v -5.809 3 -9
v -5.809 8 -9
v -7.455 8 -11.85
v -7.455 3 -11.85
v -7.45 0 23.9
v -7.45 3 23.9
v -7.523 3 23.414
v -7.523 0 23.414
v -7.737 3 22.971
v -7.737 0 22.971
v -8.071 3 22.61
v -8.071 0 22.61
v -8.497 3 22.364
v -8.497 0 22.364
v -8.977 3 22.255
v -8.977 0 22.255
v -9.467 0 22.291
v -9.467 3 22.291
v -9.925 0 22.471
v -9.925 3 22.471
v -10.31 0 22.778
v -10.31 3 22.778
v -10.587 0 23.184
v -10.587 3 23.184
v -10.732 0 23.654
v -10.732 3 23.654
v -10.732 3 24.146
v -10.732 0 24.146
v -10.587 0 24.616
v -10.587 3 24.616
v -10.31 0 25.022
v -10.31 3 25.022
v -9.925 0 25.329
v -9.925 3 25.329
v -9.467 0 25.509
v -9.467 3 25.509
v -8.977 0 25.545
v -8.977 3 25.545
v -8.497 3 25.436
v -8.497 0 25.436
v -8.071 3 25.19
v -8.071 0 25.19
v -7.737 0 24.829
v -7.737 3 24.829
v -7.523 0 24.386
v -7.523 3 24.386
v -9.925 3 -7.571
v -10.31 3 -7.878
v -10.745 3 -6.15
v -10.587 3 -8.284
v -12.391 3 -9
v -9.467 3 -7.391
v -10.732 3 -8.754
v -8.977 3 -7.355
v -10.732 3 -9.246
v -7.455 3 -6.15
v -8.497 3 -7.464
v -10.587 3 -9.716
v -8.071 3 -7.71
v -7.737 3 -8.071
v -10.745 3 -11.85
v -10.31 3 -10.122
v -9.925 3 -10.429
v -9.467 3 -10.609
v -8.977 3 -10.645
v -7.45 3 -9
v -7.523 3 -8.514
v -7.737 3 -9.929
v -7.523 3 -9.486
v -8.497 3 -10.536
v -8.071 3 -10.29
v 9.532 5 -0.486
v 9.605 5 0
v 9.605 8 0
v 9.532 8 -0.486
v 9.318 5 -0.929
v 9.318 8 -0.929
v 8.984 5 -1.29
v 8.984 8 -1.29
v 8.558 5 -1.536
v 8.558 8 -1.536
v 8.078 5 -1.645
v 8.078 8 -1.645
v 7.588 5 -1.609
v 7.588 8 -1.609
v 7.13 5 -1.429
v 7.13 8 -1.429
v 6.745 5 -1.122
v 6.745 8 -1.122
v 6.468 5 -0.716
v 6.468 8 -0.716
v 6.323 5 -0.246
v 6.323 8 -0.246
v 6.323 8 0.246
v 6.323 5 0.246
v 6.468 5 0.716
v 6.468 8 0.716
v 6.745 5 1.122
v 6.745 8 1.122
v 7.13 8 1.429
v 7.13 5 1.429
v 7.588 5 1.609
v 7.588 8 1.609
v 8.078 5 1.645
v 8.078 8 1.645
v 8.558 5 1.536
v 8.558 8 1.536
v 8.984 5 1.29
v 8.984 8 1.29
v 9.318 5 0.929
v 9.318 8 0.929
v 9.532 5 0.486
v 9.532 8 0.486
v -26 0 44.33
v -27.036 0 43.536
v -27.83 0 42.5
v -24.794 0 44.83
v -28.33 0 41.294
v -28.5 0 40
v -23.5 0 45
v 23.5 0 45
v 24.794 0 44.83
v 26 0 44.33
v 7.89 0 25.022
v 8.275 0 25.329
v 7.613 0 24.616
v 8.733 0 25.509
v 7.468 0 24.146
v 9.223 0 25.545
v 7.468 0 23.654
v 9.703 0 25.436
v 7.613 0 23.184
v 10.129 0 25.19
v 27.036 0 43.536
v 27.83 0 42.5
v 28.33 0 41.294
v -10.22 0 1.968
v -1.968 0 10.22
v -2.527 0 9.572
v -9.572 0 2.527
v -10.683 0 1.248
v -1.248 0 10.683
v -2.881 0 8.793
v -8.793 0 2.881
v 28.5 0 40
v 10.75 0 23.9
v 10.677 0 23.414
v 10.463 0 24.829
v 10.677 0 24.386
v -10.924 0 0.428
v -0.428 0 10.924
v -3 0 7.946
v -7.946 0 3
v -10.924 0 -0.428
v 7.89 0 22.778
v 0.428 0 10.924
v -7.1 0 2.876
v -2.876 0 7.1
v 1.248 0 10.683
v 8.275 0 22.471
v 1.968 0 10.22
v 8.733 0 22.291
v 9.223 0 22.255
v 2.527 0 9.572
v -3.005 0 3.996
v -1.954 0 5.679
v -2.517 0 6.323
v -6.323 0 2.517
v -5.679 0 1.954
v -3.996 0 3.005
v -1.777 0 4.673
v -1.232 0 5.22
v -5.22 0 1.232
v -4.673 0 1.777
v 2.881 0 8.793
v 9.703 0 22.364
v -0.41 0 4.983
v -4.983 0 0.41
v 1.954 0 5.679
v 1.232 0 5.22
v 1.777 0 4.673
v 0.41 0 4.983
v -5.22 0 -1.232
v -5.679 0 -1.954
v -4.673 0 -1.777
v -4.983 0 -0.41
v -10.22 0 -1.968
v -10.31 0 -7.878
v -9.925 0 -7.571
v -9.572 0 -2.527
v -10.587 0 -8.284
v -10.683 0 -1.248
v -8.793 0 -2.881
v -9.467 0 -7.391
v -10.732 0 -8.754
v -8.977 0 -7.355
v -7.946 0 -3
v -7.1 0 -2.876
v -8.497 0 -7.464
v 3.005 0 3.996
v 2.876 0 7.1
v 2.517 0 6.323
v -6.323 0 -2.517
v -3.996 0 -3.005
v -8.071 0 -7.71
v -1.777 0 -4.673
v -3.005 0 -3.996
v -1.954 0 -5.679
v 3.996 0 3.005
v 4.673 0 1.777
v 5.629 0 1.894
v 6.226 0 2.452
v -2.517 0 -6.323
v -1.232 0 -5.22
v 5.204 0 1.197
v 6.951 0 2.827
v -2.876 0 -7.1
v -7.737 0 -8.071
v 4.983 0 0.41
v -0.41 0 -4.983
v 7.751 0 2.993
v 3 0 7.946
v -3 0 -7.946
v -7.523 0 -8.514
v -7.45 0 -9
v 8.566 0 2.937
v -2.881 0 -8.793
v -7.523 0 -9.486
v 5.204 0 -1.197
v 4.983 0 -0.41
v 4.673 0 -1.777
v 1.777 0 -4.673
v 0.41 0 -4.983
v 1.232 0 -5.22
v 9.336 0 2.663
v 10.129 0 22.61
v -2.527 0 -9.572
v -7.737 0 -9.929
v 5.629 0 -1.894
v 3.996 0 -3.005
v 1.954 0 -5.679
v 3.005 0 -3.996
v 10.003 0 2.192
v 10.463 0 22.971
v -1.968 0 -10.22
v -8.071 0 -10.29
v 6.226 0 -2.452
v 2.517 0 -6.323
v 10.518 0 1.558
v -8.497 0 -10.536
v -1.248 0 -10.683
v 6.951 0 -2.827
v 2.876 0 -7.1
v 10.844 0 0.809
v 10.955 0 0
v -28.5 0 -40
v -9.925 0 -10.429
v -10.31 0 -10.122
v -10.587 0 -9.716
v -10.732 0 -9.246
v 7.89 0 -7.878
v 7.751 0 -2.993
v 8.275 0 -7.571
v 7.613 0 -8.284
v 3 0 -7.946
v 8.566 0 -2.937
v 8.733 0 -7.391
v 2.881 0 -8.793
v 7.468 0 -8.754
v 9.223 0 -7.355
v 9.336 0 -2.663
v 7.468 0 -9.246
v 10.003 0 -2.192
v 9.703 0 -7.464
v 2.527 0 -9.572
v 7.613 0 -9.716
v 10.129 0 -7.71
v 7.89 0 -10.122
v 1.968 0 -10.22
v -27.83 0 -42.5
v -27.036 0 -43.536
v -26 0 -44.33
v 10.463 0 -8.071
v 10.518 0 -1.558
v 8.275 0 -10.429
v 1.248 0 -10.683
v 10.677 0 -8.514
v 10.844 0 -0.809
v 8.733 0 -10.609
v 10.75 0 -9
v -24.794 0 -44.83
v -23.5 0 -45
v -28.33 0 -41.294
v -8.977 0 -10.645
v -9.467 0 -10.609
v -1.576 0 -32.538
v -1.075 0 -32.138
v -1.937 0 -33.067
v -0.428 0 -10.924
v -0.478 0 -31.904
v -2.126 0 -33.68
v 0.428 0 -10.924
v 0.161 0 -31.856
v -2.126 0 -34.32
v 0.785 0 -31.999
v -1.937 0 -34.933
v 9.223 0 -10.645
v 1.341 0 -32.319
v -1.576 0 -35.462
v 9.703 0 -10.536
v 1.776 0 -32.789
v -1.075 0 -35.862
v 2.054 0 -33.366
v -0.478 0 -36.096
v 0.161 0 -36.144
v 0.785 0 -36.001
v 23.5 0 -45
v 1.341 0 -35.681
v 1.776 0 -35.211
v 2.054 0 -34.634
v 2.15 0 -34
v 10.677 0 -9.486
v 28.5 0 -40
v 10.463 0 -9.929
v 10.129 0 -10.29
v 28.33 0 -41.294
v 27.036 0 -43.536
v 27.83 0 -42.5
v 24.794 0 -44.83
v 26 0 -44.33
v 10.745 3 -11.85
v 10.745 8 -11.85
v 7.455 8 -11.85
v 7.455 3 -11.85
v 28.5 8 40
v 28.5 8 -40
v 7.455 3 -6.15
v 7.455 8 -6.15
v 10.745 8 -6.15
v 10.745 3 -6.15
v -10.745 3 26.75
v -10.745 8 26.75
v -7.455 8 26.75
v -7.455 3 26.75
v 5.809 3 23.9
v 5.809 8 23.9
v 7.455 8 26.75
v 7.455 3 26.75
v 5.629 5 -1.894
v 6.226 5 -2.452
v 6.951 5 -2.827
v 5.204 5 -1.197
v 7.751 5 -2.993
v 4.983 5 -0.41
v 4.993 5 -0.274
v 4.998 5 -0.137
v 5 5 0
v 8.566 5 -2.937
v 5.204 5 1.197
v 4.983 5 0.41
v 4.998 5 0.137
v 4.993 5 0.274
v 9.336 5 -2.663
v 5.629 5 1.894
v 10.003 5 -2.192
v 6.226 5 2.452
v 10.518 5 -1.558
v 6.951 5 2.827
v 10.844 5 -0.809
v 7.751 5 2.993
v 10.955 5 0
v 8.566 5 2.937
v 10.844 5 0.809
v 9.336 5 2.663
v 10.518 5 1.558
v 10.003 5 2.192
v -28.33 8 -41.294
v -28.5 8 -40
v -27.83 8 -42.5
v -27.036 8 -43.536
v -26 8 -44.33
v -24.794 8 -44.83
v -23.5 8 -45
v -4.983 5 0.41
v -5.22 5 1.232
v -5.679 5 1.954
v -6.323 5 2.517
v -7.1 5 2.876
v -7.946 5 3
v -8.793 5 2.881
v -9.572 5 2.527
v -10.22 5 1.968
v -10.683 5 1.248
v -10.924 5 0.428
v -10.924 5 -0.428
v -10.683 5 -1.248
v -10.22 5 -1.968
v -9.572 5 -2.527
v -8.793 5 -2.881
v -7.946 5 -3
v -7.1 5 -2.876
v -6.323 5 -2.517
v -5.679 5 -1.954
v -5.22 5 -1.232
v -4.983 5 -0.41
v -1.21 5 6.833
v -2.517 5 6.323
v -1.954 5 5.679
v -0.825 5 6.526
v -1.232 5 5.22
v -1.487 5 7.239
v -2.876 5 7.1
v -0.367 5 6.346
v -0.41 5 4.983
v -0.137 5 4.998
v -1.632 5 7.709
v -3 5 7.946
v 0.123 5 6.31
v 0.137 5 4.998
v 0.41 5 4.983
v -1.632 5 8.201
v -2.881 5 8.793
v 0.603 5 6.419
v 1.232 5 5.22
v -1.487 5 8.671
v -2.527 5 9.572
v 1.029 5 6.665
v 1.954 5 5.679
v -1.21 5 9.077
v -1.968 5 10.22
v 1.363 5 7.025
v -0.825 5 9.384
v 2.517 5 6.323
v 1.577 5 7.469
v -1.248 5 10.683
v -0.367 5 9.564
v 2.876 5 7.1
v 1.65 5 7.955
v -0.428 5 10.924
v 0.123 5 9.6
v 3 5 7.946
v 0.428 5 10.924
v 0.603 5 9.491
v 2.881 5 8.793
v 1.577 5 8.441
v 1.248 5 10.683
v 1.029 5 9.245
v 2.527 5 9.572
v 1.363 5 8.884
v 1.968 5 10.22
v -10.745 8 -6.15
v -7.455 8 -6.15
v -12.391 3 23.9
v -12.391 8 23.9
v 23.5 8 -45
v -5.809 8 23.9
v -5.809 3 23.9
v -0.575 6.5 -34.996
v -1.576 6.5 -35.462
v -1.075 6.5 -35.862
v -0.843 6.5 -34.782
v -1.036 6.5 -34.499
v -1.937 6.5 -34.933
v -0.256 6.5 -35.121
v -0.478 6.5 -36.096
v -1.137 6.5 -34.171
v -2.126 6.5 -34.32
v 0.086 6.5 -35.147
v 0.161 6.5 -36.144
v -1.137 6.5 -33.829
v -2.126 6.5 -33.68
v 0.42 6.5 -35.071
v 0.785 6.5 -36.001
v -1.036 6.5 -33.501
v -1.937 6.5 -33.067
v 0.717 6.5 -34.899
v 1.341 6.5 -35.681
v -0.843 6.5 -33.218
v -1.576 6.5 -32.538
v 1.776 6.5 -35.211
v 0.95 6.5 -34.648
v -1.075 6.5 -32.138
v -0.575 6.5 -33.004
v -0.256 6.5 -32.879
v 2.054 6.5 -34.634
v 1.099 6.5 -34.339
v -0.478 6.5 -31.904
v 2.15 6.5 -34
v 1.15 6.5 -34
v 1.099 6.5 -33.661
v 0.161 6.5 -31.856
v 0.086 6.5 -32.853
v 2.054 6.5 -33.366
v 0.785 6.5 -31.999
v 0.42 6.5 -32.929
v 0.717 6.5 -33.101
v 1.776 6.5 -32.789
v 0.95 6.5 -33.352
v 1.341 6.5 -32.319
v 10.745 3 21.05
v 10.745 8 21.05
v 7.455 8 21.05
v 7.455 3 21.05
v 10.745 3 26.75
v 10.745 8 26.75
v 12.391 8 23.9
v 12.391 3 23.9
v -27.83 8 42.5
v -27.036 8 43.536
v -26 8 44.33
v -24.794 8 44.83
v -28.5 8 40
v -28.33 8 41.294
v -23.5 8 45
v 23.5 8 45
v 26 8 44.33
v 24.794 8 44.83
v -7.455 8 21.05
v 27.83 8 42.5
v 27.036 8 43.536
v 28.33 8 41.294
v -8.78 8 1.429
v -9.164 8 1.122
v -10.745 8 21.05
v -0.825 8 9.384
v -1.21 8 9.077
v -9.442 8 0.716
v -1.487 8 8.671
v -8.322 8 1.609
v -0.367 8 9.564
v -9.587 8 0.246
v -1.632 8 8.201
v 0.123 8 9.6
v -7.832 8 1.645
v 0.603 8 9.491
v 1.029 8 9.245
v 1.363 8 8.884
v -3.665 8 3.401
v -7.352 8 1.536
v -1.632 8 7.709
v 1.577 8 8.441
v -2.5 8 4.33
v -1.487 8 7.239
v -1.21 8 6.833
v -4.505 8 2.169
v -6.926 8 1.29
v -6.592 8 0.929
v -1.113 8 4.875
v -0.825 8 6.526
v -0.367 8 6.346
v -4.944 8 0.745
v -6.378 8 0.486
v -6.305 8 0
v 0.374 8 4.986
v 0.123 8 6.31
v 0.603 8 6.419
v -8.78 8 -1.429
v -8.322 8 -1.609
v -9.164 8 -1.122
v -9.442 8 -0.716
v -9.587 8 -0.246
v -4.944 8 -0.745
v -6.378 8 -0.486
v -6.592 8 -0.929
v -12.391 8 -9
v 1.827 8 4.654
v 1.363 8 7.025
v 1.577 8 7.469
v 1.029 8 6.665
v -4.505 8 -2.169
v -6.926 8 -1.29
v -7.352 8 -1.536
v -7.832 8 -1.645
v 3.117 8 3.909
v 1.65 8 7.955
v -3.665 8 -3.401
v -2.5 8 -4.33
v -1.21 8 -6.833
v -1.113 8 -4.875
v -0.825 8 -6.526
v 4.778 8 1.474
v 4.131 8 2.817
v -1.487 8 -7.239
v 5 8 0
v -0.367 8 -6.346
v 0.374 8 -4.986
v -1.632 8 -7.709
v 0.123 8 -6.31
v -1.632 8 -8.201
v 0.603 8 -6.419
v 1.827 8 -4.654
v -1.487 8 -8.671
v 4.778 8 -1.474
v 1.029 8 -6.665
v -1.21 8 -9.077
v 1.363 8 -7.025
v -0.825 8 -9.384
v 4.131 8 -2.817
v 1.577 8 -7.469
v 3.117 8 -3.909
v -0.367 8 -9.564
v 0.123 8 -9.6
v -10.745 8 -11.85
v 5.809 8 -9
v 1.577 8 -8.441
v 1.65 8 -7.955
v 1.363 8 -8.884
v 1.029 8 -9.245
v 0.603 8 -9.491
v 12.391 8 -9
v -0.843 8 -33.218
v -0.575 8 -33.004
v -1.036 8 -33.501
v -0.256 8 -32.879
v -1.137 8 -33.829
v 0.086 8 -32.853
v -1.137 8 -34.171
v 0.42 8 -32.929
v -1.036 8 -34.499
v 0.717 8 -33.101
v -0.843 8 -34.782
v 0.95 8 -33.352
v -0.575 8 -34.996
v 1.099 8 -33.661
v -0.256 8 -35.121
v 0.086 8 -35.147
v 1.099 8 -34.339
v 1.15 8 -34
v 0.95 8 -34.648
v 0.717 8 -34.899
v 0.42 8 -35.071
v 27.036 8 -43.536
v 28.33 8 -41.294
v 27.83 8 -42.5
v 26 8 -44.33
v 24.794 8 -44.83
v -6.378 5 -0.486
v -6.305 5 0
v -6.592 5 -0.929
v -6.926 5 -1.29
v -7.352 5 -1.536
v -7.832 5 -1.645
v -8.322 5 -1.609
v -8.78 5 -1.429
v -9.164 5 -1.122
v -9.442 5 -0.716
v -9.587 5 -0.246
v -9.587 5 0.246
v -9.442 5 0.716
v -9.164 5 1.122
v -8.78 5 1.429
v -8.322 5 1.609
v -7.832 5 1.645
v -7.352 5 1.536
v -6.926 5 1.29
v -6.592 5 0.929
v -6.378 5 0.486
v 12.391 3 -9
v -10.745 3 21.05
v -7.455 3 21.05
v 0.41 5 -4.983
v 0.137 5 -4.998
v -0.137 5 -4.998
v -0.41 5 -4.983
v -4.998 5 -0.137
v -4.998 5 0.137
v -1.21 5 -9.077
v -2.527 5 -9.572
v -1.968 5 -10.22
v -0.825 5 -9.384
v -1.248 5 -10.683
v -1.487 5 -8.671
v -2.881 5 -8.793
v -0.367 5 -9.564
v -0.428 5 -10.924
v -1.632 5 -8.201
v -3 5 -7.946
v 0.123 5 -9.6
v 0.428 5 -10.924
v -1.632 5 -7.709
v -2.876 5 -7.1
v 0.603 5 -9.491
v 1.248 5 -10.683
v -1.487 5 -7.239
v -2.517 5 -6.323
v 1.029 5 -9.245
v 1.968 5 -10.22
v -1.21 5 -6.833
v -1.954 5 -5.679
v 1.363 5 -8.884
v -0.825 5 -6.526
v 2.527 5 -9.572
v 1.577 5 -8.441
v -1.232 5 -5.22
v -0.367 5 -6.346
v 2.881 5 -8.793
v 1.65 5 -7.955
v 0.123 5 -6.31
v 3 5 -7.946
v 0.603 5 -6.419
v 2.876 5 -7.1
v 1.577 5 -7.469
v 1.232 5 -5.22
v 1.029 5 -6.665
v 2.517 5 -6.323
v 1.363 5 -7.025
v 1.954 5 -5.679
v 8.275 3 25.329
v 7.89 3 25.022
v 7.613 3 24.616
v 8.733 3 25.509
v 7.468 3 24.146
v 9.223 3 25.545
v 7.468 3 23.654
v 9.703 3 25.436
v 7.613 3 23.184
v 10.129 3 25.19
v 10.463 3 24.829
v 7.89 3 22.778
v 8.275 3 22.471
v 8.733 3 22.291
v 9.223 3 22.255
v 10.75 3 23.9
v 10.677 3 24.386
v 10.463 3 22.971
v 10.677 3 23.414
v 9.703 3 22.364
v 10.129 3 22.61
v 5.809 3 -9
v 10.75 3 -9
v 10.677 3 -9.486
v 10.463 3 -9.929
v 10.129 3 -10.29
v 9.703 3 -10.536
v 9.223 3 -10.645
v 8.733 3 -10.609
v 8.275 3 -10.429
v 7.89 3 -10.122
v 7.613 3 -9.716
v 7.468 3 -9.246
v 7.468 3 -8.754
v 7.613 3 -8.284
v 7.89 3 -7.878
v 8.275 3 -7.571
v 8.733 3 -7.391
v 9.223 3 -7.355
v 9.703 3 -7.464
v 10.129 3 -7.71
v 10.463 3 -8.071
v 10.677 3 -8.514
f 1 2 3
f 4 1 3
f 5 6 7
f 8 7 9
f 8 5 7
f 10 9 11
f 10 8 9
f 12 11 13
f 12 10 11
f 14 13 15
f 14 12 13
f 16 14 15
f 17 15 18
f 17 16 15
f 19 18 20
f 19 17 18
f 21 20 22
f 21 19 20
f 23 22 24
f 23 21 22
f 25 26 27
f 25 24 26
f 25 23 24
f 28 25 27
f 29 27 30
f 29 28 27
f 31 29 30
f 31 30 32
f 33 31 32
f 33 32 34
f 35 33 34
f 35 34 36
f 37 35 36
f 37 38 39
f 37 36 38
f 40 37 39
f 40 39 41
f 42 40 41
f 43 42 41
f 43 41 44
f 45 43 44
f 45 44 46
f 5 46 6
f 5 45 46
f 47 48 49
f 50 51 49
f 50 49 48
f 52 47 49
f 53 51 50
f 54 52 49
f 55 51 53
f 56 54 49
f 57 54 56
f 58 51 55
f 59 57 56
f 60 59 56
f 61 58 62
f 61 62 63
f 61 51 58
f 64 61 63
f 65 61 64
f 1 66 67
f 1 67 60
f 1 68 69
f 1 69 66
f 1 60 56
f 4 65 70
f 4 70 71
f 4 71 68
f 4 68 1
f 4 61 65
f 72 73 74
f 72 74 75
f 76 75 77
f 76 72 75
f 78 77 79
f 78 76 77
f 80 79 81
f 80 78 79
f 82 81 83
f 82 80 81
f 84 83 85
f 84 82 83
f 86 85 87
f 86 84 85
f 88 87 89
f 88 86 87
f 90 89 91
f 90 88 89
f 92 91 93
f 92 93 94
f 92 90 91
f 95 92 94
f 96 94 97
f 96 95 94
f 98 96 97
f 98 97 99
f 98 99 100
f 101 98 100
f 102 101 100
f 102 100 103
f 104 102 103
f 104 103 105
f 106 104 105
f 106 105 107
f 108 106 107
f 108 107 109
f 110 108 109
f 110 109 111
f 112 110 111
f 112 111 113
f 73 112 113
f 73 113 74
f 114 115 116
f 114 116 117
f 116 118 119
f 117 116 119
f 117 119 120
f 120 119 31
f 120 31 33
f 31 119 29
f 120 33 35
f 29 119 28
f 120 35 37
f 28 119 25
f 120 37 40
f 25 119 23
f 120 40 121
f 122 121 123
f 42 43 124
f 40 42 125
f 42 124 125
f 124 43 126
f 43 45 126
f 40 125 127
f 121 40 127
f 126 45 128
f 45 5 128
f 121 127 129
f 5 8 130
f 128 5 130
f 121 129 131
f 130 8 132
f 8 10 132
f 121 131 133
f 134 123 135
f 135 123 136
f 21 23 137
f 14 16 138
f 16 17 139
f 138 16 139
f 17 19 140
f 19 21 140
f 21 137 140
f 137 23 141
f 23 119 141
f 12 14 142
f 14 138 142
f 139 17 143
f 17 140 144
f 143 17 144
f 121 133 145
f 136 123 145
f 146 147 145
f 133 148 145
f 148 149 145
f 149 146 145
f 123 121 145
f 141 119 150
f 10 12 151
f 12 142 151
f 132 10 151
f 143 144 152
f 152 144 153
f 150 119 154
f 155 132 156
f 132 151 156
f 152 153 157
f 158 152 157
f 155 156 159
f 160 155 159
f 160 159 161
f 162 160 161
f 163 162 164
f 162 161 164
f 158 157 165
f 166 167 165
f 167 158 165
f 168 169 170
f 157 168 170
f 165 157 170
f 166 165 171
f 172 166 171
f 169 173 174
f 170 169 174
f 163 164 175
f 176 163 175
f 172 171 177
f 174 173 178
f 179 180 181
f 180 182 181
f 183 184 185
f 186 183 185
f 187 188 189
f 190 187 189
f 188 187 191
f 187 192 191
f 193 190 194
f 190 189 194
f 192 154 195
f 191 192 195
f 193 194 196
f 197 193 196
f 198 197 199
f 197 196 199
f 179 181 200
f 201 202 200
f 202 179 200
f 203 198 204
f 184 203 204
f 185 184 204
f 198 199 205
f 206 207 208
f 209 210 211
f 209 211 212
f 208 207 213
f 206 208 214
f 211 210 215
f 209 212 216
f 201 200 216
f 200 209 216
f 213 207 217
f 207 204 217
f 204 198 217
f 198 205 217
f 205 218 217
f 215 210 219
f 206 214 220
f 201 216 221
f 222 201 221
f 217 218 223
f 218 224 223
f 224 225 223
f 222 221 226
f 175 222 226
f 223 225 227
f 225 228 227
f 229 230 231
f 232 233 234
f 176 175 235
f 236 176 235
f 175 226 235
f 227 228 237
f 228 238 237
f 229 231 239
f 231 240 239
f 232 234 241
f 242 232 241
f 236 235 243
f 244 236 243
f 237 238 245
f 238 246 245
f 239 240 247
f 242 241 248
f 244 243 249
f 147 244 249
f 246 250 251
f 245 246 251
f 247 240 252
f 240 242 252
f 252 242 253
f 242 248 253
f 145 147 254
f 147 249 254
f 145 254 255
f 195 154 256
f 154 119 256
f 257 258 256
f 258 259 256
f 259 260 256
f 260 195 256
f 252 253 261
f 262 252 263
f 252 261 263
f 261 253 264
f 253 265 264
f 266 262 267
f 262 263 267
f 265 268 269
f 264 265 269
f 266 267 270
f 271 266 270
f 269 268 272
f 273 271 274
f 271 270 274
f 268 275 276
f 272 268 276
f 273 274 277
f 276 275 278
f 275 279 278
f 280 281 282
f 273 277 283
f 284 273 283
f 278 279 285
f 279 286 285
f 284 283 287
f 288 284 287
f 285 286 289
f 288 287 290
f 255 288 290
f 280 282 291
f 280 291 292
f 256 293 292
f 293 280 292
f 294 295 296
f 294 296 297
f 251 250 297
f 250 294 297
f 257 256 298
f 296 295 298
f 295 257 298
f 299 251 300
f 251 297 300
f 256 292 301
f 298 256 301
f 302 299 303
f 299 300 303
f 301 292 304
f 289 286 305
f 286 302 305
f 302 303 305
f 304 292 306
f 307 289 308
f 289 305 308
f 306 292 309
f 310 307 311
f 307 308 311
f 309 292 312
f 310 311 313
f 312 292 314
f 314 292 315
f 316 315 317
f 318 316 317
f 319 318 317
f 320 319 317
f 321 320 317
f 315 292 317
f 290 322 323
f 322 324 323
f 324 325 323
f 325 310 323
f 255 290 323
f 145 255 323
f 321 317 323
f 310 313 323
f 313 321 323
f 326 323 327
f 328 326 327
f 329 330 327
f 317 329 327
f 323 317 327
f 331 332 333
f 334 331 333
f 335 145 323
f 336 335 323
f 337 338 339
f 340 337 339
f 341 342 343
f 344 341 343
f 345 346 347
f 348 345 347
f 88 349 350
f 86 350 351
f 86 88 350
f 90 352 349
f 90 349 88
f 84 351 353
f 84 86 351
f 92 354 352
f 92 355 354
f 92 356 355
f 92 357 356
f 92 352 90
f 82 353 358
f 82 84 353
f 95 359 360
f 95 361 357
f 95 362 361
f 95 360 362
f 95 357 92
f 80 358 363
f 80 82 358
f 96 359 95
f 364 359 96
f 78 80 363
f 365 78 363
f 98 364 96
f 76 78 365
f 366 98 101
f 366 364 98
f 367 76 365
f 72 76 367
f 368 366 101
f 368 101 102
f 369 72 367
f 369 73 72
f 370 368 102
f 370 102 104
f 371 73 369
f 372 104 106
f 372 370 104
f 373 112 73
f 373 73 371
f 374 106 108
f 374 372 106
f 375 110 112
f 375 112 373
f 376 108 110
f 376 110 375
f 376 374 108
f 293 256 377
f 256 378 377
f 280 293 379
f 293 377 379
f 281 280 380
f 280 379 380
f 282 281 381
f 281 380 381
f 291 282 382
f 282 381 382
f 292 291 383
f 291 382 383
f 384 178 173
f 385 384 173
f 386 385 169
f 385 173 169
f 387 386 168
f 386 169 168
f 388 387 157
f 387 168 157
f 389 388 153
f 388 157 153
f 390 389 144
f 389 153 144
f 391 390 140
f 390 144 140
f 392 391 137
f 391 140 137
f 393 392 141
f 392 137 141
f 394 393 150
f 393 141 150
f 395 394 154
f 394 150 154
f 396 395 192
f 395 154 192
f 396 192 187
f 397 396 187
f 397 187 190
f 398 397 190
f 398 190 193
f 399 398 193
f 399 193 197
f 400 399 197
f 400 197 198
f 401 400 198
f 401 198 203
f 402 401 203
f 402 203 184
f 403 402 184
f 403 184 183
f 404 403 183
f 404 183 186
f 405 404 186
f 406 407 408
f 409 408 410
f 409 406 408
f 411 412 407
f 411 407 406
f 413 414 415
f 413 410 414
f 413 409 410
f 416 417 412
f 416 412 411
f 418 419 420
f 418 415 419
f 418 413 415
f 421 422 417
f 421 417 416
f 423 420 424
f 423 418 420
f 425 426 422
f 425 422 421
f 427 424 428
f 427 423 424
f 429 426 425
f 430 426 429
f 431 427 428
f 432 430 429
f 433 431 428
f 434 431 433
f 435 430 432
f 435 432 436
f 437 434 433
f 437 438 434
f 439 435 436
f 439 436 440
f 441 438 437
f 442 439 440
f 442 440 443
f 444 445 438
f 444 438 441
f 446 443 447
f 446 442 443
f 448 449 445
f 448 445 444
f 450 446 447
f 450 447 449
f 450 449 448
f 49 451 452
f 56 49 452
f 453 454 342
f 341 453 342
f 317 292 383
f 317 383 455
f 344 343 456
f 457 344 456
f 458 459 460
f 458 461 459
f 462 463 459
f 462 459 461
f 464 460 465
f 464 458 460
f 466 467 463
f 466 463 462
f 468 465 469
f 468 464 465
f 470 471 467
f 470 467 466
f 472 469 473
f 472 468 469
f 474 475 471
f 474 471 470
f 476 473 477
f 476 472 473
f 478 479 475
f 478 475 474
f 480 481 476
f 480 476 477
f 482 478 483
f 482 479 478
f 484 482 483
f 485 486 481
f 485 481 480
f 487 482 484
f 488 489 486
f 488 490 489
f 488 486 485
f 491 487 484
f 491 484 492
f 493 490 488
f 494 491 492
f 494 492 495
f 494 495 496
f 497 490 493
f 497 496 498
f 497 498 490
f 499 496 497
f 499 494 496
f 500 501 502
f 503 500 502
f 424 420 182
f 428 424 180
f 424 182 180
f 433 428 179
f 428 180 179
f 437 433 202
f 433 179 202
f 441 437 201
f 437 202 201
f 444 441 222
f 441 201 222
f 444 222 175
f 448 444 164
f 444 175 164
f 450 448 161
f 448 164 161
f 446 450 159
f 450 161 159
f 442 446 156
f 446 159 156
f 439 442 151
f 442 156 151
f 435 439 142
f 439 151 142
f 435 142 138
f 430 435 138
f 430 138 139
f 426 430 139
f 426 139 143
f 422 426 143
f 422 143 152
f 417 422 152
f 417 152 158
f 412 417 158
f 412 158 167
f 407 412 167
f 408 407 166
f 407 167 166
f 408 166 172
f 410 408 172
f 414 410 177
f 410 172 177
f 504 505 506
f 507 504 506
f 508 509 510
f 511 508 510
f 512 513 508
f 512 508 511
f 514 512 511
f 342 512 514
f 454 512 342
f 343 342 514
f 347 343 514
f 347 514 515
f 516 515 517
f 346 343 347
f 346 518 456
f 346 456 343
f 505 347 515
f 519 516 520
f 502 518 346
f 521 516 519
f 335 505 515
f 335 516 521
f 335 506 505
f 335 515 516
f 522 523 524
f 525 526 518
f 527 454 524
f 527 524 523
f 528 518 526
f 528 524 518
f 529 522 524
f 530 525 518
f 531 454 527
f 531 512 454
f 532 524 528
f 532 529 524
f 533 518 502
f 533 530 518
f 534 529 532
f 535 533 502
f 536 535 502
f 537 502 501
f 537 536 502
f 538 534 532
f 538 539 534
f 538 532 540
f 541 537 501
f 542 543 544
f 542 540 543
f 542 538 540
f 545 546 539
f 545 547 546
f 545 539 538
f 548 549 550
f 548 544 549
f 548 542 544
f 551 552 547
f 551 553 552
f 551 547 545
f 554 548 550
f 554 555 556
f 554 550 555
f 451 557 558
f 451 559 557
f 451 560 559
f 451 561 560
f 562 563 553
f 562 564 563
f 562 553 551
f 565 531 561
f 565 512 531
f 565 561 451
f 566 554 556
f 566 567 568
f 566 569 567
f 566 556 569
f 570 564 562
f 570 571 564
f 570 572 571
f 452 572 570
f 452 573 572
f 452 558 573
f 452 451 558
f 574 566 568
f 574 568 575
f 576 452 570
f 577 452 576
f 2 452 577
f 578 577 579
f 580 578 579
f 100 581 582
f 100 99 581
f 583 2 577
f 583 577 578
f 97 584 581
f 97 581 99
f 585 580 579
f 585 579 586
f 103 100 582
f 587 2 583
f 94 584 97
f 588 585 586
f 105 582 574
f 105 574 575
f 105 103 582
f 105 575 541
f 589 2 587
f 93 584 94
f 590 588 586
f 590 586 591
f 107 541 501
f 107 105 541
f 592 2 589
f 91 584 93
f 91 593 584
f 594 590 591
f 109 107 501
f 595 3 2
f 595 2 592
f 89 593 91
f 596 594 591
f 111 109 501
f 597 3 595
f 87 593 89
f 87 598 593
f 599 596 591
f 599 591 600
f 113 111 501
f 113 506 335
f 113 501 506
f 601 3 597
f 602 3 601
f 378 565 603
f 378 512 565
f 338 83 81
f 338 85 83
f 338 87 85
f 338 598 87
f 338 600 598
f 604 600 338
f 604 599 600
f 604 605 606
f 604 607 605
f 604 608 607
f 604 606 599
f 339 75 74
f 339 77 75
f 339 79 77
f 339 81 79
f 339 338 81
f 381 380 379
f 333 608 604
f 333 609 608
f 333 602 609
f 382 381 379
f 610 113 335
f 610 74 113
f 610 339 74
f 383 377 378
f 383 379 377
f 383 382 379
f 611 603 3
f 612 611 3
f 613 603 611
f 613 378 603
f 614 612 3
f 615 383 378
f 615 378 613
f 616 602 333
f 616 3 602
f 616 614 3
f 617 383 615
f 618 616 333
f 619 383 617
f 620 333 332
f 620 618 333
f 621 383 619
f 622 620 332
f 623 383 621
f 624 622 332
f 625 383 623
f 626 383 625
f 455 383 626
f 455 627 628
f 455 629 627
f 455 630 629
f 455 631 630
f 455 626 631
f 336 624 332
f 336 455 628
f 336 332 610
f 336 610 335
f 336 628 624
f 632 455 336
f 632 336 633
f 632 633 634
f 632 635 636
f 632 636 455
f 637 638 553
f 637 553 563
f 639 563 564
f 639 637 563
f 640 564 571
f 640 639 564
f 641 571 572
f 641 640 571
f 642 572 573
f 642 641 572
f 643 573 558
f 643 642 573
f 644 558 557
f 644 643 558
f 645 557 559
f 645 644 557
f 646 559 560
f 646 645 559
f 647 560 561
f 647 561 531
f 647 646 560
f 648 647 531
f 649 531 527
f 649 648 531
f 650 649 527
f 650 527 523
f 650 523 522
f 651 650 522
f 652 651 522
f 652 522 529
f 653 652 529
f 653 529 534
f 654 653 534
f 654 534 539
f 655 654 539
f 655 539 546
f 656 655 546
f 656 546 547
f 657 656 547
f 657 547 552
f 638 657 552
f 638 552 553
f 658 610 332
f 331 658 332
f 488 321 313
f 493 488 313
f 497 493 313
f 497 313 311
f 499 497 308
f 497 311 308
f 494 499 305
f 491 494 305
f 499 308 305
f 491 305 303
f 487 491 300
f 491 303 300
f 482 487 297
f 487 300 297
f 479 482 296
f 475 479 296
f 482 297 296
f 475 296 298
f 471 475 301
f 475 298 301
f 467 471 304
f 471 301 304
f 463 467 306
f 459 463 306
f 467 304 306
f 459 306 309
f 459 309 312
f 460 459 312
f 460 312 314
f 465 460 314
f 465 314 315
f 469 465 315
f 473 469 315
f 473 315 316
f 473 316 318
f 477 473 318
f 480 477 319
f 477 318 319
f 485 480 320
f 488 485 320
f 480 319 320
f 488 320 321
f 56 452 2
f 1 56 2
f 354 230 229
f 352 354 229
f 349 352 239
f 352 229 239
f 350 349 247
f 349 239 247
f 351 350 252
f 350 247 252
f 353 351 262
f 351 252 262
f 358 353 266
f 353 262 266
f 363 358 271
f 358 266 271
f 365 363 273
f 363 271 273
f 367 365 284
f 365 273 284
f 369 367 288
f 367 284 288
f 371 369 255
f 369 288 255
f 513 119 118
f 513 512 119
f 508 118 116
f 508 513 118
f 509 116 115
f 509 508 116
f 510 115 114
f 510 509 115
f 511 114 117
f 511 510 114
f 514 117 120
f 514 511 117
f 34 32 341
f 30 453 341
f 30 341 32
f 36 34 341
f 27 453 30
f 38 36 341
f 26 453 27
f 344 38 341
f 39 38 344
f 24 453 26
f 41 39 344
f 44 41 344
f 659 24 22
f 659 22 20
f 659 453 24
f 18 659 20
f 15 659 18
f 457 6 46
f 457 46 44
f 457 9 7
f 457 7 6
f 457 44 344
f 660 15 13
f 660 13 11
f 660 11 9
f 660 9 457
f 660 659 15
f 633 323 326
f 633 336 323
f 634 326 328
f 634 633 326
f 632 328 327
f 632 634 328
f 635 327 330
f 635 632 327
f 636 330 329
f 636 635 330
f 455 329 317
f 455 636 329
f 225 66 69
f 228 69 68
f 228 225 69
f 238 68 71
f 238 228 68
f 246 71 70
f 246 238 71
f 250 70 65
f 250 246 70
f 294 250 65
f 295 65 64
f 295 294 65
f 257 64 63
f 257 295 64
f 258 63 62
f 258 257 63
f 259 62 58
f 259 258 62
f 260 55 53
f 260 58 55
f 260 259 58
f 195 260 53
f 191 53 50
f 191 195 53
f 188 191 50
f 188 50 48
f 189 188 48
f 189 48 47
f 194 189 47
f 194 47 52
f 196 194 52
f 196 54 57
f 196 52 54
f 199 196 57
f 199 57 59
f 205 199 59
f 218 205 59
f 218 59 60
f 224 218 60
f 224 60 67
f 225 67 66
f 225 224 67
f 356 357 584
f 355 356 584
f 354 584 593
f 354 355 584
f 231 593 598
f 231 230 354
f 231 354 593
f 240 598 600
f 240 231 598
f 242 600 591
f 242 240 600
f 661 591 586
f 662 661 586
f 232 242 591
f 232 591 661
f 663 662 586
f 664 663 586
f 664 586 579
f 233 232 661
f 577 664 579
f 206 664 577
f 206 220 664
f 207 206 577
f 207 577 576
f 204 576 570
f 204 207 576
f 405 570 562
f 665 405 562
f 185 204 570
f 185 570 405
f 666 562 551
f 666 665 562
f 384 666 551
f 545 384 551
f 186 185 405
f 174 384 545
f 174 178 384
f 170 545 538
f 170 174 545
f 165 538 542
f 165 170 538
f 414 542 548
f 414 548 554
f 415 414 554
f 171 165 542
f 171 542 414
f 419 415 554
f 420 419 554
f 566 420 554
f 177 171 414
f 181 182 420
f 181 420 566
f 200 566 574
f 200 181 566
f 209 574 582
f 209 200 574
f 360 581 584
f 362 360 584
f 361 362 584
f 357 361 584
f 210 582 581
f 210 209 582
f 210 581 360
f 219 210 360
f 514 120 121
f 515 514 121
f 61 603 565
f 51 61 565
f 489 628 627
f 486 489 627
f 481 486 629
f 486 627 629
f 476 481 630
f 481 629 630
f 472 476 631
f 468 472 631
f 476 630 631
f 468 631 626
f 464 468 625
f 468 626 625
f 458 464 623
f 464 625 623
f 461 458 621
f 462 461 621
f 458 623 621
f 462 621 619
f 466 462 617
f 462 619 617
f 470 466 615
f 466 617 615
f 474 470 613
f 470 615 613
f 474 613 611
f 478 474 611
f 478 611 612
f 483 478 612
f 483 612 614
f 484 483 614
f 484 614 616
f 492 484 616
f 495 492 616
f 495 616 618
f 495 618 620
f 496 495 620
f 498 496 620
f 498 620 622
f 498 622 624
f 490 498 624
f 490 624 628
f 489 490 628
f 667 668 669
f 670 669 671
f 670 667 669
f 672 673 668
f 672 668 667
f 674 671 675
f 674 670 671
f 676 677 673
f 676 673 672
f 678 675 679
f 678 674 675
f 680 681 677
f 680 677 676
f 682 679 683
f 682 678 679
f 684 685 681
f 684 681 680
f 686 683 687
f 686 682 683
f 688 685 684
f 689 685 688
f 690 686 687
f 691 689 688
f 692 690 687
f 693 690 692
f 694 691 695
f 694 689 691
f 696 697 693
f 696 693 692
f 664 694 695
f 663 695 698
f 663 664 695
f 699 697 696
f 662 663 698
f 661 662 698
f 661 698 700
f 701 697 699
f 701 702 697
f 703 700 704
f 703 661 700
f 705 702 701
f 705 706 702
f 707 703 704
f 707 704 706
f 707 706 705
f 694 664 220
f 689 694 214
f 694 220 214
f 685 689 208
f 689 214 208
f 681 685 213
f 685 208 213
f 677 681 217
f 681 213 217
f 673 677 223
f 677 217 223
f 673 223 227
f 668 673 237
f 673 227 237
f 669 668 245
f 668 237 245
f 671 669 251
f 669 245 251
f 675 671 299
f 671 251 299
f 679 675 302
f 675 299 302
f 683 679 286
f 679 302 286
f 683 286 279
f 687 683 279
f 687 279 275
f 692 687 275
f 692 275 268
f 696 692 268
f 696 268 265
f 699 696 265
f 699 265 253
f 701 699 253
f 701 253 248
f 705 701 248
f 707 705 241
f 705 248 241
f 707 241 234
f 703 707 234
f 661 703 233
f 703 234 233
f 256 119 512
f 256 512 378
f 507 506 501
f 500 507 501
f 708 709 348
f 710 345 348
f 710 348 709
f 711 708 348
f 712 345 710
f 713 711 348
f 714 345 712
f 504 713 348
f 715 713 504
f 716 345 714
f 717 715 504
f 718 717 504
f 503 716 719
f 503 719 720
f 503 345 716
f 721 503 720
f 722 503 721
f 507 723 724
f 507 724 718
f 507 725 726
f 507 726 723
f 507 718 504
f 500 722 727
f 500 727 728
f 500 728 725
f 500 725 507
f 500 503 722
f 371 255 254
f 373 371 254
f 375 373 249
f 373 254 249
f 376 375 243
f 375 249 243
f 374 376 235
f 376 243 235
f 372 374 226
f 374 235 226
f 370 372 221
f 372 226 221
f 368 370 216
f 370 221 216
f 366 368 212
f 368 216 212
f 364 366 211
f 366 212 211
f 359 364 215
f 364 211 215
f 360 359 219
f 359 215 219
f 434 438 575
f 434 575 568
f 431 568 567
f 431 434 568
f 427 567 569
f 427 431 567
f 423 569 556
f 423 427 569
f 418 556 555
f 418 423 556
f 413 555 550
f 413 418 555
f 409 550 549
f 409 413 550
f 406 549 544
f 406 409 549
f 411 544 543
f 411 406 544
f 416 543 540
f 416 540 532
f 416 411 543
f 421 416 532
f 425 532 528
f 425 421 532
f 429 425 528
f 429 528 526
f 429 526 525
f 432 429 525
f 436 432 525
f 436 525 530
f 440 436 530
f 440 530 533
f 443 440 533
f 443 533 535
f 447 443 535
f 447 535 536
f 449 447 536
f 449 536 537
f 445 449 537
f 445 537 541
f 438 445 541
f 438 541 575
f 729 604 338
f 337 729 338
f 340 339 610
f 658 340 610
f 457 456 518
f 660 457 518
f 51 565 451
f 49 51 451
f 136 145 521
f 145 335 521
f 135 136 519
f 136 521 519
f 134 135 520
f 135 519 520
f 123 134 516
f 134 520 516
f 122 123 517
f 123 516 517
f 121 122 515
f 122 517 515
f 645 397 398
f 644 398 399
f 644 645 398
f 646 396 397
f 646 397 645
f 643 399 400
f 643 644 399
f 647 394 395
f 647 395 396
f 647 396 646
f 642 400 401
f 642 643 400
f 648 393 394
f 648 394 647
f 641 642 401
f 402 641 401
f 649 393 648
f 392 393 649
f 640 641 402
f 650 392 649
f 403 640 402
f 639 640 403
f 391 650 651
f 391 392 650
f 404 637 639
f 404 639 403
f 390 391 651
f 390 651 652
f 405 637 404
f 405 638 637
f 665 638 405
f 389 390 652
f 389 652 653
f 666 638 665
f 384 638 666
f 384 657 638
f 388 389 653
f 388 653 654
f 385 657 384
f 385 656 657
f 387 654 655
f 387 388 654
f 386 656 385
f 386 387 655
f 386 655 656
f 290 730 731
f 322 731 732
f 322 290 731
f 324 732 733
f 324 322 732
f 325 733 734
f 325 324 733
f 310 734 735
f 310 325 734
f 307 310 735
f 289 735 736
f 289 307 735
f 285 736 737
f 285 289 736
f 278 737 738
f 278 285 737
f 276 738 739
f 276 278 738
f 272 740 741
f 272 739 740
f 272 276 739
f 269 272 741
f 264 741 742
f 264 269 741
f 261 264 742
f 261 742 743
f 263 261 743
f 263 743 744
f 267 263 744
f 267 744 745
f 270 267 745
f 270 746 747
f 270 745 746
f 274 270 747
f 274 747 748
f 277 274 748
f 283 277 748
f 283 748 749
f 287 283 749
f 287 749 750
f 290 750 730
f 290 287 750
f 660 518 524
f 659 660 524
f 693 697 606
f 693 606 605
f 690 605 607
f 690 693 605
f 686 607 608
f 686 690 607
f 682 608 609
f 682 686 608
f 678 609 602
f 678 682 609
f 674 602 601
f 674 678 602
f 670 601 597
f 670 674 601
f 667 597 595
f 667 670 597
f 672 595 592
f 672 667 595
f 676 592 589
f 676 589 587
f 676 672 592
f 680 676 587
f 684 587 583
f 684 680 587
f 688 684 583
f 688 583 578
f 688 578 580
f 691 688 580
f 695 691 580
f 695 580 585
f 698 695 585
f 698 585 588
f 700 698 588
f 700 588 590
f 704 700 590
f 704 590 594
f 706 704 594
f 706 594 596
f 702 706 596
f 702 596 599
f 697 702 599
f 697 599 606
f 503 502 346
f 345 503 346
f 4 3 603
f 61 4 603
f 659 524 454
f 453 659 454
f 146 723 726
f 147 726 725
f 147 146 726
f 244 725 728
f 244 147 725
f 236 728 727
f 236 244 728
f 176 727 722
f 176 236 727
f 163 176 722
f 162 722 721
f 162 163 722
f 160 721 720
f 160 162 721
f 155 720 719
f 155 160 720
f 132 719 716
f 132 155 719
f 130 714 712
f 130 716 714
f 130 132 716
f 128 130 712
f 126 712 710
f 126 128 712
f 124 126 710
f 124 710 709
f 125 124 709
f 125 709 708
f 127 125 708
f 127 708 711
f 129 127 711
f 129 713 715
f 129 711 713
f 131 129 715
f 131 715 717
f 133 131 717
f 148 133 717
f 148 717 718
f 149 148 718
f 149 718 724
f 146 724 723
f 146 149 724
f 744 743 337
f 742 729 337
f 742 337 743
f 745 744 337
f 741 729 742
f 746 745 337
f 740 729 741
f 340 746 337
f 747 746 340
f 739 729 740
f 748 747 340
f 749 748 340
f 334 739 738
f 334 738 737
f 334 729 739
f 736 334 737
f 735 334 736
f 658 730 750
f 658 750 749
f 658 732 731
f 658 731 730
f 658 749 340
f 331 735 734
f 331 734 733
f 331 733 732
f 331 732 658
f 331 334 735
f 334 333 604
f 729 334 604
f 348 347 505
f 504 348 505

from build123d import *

# Parameters (mm, degrees)
SKETCH_1_W          = 57
SKETCH_1_H          = 90
SKETCH_1_R          = 5
SKETCH_1_R_2        = 1.65
EXTRUDE_1_DEPTH     = 8
CUT_EXTRUDE_1_DEPTH = 5
SKETCH_3_R          = 3
CUT_EXTRUDE_2_DEPTH = 5
FILLET_1_R          = 5
SKETCH_4_R          = 1.15
CUT_EXTRUDE_3_DEPTH = 9
SKETCH_5_R          = 2.15
CUT_EXTRUDE_4_DEPTH = 6.5


with BuildPart() as part:
    # 草图1 → 凸台-拉伸1 (new body)
    with BuildSketch(Plane(origin=(0, 0, 0), x_dir=(1, 0, 0), z_dir=(0, 1, 0))):
        Rectangle(SKETCH_1_W, SKETCH_1_H)
        Circle(SKETCH_1_R, mode=Mode.SUBTRACT)
        with Locations((0, 7.954951288)):
            Circle(SKETCH_1_R_2, mode=Mode.SUBTRACT)
        with Locations((7.954951288, 0)):
            Circle(SKETCH_1_R_2, mode=Mode.SUBTRACT)
        with Locations((0, -7.954951288)):
            Circle(SKETCH_1_R_2, mode=Mode.SUBTRACT)
        with Locations((-7.954951288, 0)):
            Circle(SKETCH_1_R_2, mode=Mode.SUBTRACT)
        with Locations((9.1, 9)):
            Circle(SKETCH_1_R_2, mode=Mode.SUBTRACT)
        with Locations((-9.1, 9)):
            Circle(SKETCH_1_R_2, mode=Mode.SUBTRACT)
        with Locations((-9.1, -23.9)):
            Circle(SKETCH_1_R_2, mode=Mode.SUBTRACT)
        with Locations((9.1, -23.9)):
            Circle(SKETCH_1_R_2, mode=Mode.SUBTRACT)
    extrude(amount=EXTRUDE_1_DEPTH)

    # 草图2 → 切除-拉伸1 (cut)
    with BuildSketch(Plane(origin=(0, 8, 0), x_dir=(1, 0, 0), z_dir=(0, 1, 0))):
        Polygon((-7.454551733, 11.85), (-10.745448267, 11.85), (-12.390896534, 9), (-10.745448267, 6.15), (-7.454551733, 6.15), (-5.809103466, 9), align=None)
        Polygon((10.745448267, 11.85), (7.454551733, 11.85), (5.809103466, 9), (7.454551733, 6.15), (10.745448267, 6.15), (12.390896534, 9), align=None)
        Polygon((10.745448267, -21.05), (7.454551733, -21.05), (5.809103466, -23.9), (7.454551733, -26.75), (10.745448267, -26.75), (12.390896534, -23.9), align=None)
        Polygon((-10.745448267, -21.05), (-12.390896534, -23.9), (-10.745448267, -26.75), (-7.454551733, -26.75), (-5.809103466, -23.9), (-7.454551733, -21.05), align=None)
    extrude(amount=-CUT_EXTRUDE_1_DEPTH, mode=Mode.SUBTRACT)

    # 草图3 → 切除-拉伸2 (cut)
    with BuildSketch(Plane.XZ):
        with Locations((0, 7.954951288)):
            Circle(SKETCH_3_R)
        with Locations((7.954951288, 0)):
            Circle(SKETCH_3_R)
        with Locations((0, -7.954951288)):
            Circle(SKETCH_3_R)
        with Locations((-7.954951288, 0)):
            Circle(SKETCH_3_R)
    extrude(amount=-CUT_EXTRUDE_2_DEPTH, mode=Mode.SUBTRACT)

    # 圆角1
    fillet_1_edges = [part.edges().sort_by_distance(p)[0] for p in [
        (28.5, 4, 45),
        (-28.5, 4, 45),
        (-28.5, 4, -45),
        (28.5, 4, -45),
    ]]
    fillet(fillet_1_edges, radius=FILLET_1_R)

    # 草图4 → 切除-拉伸3 (cut, through all)
    with BuildSketch(Plane(origin=(0, 8, 0), x_dir=(1, 0, 0), z_dir=(0, 1, 0))):
        with Locations((0, 34)):
            Circle(SKETCH_4_R)
    extrude(amount=-CUT_EXTRUDE_3_DEPTH, mode=Mode.SUBTRACT)

    # 草图5 → 切除-拉伸4 (cut)
    with BuildSketch(Plane.XZ):
        with Locations((0, -34)):
            Circle(SKETCH_5_R)
    extrude(amount=-CUT_EXTRUDE_4_DEPTH, mode=Mode.SUBTRACT)


solid = part.part
